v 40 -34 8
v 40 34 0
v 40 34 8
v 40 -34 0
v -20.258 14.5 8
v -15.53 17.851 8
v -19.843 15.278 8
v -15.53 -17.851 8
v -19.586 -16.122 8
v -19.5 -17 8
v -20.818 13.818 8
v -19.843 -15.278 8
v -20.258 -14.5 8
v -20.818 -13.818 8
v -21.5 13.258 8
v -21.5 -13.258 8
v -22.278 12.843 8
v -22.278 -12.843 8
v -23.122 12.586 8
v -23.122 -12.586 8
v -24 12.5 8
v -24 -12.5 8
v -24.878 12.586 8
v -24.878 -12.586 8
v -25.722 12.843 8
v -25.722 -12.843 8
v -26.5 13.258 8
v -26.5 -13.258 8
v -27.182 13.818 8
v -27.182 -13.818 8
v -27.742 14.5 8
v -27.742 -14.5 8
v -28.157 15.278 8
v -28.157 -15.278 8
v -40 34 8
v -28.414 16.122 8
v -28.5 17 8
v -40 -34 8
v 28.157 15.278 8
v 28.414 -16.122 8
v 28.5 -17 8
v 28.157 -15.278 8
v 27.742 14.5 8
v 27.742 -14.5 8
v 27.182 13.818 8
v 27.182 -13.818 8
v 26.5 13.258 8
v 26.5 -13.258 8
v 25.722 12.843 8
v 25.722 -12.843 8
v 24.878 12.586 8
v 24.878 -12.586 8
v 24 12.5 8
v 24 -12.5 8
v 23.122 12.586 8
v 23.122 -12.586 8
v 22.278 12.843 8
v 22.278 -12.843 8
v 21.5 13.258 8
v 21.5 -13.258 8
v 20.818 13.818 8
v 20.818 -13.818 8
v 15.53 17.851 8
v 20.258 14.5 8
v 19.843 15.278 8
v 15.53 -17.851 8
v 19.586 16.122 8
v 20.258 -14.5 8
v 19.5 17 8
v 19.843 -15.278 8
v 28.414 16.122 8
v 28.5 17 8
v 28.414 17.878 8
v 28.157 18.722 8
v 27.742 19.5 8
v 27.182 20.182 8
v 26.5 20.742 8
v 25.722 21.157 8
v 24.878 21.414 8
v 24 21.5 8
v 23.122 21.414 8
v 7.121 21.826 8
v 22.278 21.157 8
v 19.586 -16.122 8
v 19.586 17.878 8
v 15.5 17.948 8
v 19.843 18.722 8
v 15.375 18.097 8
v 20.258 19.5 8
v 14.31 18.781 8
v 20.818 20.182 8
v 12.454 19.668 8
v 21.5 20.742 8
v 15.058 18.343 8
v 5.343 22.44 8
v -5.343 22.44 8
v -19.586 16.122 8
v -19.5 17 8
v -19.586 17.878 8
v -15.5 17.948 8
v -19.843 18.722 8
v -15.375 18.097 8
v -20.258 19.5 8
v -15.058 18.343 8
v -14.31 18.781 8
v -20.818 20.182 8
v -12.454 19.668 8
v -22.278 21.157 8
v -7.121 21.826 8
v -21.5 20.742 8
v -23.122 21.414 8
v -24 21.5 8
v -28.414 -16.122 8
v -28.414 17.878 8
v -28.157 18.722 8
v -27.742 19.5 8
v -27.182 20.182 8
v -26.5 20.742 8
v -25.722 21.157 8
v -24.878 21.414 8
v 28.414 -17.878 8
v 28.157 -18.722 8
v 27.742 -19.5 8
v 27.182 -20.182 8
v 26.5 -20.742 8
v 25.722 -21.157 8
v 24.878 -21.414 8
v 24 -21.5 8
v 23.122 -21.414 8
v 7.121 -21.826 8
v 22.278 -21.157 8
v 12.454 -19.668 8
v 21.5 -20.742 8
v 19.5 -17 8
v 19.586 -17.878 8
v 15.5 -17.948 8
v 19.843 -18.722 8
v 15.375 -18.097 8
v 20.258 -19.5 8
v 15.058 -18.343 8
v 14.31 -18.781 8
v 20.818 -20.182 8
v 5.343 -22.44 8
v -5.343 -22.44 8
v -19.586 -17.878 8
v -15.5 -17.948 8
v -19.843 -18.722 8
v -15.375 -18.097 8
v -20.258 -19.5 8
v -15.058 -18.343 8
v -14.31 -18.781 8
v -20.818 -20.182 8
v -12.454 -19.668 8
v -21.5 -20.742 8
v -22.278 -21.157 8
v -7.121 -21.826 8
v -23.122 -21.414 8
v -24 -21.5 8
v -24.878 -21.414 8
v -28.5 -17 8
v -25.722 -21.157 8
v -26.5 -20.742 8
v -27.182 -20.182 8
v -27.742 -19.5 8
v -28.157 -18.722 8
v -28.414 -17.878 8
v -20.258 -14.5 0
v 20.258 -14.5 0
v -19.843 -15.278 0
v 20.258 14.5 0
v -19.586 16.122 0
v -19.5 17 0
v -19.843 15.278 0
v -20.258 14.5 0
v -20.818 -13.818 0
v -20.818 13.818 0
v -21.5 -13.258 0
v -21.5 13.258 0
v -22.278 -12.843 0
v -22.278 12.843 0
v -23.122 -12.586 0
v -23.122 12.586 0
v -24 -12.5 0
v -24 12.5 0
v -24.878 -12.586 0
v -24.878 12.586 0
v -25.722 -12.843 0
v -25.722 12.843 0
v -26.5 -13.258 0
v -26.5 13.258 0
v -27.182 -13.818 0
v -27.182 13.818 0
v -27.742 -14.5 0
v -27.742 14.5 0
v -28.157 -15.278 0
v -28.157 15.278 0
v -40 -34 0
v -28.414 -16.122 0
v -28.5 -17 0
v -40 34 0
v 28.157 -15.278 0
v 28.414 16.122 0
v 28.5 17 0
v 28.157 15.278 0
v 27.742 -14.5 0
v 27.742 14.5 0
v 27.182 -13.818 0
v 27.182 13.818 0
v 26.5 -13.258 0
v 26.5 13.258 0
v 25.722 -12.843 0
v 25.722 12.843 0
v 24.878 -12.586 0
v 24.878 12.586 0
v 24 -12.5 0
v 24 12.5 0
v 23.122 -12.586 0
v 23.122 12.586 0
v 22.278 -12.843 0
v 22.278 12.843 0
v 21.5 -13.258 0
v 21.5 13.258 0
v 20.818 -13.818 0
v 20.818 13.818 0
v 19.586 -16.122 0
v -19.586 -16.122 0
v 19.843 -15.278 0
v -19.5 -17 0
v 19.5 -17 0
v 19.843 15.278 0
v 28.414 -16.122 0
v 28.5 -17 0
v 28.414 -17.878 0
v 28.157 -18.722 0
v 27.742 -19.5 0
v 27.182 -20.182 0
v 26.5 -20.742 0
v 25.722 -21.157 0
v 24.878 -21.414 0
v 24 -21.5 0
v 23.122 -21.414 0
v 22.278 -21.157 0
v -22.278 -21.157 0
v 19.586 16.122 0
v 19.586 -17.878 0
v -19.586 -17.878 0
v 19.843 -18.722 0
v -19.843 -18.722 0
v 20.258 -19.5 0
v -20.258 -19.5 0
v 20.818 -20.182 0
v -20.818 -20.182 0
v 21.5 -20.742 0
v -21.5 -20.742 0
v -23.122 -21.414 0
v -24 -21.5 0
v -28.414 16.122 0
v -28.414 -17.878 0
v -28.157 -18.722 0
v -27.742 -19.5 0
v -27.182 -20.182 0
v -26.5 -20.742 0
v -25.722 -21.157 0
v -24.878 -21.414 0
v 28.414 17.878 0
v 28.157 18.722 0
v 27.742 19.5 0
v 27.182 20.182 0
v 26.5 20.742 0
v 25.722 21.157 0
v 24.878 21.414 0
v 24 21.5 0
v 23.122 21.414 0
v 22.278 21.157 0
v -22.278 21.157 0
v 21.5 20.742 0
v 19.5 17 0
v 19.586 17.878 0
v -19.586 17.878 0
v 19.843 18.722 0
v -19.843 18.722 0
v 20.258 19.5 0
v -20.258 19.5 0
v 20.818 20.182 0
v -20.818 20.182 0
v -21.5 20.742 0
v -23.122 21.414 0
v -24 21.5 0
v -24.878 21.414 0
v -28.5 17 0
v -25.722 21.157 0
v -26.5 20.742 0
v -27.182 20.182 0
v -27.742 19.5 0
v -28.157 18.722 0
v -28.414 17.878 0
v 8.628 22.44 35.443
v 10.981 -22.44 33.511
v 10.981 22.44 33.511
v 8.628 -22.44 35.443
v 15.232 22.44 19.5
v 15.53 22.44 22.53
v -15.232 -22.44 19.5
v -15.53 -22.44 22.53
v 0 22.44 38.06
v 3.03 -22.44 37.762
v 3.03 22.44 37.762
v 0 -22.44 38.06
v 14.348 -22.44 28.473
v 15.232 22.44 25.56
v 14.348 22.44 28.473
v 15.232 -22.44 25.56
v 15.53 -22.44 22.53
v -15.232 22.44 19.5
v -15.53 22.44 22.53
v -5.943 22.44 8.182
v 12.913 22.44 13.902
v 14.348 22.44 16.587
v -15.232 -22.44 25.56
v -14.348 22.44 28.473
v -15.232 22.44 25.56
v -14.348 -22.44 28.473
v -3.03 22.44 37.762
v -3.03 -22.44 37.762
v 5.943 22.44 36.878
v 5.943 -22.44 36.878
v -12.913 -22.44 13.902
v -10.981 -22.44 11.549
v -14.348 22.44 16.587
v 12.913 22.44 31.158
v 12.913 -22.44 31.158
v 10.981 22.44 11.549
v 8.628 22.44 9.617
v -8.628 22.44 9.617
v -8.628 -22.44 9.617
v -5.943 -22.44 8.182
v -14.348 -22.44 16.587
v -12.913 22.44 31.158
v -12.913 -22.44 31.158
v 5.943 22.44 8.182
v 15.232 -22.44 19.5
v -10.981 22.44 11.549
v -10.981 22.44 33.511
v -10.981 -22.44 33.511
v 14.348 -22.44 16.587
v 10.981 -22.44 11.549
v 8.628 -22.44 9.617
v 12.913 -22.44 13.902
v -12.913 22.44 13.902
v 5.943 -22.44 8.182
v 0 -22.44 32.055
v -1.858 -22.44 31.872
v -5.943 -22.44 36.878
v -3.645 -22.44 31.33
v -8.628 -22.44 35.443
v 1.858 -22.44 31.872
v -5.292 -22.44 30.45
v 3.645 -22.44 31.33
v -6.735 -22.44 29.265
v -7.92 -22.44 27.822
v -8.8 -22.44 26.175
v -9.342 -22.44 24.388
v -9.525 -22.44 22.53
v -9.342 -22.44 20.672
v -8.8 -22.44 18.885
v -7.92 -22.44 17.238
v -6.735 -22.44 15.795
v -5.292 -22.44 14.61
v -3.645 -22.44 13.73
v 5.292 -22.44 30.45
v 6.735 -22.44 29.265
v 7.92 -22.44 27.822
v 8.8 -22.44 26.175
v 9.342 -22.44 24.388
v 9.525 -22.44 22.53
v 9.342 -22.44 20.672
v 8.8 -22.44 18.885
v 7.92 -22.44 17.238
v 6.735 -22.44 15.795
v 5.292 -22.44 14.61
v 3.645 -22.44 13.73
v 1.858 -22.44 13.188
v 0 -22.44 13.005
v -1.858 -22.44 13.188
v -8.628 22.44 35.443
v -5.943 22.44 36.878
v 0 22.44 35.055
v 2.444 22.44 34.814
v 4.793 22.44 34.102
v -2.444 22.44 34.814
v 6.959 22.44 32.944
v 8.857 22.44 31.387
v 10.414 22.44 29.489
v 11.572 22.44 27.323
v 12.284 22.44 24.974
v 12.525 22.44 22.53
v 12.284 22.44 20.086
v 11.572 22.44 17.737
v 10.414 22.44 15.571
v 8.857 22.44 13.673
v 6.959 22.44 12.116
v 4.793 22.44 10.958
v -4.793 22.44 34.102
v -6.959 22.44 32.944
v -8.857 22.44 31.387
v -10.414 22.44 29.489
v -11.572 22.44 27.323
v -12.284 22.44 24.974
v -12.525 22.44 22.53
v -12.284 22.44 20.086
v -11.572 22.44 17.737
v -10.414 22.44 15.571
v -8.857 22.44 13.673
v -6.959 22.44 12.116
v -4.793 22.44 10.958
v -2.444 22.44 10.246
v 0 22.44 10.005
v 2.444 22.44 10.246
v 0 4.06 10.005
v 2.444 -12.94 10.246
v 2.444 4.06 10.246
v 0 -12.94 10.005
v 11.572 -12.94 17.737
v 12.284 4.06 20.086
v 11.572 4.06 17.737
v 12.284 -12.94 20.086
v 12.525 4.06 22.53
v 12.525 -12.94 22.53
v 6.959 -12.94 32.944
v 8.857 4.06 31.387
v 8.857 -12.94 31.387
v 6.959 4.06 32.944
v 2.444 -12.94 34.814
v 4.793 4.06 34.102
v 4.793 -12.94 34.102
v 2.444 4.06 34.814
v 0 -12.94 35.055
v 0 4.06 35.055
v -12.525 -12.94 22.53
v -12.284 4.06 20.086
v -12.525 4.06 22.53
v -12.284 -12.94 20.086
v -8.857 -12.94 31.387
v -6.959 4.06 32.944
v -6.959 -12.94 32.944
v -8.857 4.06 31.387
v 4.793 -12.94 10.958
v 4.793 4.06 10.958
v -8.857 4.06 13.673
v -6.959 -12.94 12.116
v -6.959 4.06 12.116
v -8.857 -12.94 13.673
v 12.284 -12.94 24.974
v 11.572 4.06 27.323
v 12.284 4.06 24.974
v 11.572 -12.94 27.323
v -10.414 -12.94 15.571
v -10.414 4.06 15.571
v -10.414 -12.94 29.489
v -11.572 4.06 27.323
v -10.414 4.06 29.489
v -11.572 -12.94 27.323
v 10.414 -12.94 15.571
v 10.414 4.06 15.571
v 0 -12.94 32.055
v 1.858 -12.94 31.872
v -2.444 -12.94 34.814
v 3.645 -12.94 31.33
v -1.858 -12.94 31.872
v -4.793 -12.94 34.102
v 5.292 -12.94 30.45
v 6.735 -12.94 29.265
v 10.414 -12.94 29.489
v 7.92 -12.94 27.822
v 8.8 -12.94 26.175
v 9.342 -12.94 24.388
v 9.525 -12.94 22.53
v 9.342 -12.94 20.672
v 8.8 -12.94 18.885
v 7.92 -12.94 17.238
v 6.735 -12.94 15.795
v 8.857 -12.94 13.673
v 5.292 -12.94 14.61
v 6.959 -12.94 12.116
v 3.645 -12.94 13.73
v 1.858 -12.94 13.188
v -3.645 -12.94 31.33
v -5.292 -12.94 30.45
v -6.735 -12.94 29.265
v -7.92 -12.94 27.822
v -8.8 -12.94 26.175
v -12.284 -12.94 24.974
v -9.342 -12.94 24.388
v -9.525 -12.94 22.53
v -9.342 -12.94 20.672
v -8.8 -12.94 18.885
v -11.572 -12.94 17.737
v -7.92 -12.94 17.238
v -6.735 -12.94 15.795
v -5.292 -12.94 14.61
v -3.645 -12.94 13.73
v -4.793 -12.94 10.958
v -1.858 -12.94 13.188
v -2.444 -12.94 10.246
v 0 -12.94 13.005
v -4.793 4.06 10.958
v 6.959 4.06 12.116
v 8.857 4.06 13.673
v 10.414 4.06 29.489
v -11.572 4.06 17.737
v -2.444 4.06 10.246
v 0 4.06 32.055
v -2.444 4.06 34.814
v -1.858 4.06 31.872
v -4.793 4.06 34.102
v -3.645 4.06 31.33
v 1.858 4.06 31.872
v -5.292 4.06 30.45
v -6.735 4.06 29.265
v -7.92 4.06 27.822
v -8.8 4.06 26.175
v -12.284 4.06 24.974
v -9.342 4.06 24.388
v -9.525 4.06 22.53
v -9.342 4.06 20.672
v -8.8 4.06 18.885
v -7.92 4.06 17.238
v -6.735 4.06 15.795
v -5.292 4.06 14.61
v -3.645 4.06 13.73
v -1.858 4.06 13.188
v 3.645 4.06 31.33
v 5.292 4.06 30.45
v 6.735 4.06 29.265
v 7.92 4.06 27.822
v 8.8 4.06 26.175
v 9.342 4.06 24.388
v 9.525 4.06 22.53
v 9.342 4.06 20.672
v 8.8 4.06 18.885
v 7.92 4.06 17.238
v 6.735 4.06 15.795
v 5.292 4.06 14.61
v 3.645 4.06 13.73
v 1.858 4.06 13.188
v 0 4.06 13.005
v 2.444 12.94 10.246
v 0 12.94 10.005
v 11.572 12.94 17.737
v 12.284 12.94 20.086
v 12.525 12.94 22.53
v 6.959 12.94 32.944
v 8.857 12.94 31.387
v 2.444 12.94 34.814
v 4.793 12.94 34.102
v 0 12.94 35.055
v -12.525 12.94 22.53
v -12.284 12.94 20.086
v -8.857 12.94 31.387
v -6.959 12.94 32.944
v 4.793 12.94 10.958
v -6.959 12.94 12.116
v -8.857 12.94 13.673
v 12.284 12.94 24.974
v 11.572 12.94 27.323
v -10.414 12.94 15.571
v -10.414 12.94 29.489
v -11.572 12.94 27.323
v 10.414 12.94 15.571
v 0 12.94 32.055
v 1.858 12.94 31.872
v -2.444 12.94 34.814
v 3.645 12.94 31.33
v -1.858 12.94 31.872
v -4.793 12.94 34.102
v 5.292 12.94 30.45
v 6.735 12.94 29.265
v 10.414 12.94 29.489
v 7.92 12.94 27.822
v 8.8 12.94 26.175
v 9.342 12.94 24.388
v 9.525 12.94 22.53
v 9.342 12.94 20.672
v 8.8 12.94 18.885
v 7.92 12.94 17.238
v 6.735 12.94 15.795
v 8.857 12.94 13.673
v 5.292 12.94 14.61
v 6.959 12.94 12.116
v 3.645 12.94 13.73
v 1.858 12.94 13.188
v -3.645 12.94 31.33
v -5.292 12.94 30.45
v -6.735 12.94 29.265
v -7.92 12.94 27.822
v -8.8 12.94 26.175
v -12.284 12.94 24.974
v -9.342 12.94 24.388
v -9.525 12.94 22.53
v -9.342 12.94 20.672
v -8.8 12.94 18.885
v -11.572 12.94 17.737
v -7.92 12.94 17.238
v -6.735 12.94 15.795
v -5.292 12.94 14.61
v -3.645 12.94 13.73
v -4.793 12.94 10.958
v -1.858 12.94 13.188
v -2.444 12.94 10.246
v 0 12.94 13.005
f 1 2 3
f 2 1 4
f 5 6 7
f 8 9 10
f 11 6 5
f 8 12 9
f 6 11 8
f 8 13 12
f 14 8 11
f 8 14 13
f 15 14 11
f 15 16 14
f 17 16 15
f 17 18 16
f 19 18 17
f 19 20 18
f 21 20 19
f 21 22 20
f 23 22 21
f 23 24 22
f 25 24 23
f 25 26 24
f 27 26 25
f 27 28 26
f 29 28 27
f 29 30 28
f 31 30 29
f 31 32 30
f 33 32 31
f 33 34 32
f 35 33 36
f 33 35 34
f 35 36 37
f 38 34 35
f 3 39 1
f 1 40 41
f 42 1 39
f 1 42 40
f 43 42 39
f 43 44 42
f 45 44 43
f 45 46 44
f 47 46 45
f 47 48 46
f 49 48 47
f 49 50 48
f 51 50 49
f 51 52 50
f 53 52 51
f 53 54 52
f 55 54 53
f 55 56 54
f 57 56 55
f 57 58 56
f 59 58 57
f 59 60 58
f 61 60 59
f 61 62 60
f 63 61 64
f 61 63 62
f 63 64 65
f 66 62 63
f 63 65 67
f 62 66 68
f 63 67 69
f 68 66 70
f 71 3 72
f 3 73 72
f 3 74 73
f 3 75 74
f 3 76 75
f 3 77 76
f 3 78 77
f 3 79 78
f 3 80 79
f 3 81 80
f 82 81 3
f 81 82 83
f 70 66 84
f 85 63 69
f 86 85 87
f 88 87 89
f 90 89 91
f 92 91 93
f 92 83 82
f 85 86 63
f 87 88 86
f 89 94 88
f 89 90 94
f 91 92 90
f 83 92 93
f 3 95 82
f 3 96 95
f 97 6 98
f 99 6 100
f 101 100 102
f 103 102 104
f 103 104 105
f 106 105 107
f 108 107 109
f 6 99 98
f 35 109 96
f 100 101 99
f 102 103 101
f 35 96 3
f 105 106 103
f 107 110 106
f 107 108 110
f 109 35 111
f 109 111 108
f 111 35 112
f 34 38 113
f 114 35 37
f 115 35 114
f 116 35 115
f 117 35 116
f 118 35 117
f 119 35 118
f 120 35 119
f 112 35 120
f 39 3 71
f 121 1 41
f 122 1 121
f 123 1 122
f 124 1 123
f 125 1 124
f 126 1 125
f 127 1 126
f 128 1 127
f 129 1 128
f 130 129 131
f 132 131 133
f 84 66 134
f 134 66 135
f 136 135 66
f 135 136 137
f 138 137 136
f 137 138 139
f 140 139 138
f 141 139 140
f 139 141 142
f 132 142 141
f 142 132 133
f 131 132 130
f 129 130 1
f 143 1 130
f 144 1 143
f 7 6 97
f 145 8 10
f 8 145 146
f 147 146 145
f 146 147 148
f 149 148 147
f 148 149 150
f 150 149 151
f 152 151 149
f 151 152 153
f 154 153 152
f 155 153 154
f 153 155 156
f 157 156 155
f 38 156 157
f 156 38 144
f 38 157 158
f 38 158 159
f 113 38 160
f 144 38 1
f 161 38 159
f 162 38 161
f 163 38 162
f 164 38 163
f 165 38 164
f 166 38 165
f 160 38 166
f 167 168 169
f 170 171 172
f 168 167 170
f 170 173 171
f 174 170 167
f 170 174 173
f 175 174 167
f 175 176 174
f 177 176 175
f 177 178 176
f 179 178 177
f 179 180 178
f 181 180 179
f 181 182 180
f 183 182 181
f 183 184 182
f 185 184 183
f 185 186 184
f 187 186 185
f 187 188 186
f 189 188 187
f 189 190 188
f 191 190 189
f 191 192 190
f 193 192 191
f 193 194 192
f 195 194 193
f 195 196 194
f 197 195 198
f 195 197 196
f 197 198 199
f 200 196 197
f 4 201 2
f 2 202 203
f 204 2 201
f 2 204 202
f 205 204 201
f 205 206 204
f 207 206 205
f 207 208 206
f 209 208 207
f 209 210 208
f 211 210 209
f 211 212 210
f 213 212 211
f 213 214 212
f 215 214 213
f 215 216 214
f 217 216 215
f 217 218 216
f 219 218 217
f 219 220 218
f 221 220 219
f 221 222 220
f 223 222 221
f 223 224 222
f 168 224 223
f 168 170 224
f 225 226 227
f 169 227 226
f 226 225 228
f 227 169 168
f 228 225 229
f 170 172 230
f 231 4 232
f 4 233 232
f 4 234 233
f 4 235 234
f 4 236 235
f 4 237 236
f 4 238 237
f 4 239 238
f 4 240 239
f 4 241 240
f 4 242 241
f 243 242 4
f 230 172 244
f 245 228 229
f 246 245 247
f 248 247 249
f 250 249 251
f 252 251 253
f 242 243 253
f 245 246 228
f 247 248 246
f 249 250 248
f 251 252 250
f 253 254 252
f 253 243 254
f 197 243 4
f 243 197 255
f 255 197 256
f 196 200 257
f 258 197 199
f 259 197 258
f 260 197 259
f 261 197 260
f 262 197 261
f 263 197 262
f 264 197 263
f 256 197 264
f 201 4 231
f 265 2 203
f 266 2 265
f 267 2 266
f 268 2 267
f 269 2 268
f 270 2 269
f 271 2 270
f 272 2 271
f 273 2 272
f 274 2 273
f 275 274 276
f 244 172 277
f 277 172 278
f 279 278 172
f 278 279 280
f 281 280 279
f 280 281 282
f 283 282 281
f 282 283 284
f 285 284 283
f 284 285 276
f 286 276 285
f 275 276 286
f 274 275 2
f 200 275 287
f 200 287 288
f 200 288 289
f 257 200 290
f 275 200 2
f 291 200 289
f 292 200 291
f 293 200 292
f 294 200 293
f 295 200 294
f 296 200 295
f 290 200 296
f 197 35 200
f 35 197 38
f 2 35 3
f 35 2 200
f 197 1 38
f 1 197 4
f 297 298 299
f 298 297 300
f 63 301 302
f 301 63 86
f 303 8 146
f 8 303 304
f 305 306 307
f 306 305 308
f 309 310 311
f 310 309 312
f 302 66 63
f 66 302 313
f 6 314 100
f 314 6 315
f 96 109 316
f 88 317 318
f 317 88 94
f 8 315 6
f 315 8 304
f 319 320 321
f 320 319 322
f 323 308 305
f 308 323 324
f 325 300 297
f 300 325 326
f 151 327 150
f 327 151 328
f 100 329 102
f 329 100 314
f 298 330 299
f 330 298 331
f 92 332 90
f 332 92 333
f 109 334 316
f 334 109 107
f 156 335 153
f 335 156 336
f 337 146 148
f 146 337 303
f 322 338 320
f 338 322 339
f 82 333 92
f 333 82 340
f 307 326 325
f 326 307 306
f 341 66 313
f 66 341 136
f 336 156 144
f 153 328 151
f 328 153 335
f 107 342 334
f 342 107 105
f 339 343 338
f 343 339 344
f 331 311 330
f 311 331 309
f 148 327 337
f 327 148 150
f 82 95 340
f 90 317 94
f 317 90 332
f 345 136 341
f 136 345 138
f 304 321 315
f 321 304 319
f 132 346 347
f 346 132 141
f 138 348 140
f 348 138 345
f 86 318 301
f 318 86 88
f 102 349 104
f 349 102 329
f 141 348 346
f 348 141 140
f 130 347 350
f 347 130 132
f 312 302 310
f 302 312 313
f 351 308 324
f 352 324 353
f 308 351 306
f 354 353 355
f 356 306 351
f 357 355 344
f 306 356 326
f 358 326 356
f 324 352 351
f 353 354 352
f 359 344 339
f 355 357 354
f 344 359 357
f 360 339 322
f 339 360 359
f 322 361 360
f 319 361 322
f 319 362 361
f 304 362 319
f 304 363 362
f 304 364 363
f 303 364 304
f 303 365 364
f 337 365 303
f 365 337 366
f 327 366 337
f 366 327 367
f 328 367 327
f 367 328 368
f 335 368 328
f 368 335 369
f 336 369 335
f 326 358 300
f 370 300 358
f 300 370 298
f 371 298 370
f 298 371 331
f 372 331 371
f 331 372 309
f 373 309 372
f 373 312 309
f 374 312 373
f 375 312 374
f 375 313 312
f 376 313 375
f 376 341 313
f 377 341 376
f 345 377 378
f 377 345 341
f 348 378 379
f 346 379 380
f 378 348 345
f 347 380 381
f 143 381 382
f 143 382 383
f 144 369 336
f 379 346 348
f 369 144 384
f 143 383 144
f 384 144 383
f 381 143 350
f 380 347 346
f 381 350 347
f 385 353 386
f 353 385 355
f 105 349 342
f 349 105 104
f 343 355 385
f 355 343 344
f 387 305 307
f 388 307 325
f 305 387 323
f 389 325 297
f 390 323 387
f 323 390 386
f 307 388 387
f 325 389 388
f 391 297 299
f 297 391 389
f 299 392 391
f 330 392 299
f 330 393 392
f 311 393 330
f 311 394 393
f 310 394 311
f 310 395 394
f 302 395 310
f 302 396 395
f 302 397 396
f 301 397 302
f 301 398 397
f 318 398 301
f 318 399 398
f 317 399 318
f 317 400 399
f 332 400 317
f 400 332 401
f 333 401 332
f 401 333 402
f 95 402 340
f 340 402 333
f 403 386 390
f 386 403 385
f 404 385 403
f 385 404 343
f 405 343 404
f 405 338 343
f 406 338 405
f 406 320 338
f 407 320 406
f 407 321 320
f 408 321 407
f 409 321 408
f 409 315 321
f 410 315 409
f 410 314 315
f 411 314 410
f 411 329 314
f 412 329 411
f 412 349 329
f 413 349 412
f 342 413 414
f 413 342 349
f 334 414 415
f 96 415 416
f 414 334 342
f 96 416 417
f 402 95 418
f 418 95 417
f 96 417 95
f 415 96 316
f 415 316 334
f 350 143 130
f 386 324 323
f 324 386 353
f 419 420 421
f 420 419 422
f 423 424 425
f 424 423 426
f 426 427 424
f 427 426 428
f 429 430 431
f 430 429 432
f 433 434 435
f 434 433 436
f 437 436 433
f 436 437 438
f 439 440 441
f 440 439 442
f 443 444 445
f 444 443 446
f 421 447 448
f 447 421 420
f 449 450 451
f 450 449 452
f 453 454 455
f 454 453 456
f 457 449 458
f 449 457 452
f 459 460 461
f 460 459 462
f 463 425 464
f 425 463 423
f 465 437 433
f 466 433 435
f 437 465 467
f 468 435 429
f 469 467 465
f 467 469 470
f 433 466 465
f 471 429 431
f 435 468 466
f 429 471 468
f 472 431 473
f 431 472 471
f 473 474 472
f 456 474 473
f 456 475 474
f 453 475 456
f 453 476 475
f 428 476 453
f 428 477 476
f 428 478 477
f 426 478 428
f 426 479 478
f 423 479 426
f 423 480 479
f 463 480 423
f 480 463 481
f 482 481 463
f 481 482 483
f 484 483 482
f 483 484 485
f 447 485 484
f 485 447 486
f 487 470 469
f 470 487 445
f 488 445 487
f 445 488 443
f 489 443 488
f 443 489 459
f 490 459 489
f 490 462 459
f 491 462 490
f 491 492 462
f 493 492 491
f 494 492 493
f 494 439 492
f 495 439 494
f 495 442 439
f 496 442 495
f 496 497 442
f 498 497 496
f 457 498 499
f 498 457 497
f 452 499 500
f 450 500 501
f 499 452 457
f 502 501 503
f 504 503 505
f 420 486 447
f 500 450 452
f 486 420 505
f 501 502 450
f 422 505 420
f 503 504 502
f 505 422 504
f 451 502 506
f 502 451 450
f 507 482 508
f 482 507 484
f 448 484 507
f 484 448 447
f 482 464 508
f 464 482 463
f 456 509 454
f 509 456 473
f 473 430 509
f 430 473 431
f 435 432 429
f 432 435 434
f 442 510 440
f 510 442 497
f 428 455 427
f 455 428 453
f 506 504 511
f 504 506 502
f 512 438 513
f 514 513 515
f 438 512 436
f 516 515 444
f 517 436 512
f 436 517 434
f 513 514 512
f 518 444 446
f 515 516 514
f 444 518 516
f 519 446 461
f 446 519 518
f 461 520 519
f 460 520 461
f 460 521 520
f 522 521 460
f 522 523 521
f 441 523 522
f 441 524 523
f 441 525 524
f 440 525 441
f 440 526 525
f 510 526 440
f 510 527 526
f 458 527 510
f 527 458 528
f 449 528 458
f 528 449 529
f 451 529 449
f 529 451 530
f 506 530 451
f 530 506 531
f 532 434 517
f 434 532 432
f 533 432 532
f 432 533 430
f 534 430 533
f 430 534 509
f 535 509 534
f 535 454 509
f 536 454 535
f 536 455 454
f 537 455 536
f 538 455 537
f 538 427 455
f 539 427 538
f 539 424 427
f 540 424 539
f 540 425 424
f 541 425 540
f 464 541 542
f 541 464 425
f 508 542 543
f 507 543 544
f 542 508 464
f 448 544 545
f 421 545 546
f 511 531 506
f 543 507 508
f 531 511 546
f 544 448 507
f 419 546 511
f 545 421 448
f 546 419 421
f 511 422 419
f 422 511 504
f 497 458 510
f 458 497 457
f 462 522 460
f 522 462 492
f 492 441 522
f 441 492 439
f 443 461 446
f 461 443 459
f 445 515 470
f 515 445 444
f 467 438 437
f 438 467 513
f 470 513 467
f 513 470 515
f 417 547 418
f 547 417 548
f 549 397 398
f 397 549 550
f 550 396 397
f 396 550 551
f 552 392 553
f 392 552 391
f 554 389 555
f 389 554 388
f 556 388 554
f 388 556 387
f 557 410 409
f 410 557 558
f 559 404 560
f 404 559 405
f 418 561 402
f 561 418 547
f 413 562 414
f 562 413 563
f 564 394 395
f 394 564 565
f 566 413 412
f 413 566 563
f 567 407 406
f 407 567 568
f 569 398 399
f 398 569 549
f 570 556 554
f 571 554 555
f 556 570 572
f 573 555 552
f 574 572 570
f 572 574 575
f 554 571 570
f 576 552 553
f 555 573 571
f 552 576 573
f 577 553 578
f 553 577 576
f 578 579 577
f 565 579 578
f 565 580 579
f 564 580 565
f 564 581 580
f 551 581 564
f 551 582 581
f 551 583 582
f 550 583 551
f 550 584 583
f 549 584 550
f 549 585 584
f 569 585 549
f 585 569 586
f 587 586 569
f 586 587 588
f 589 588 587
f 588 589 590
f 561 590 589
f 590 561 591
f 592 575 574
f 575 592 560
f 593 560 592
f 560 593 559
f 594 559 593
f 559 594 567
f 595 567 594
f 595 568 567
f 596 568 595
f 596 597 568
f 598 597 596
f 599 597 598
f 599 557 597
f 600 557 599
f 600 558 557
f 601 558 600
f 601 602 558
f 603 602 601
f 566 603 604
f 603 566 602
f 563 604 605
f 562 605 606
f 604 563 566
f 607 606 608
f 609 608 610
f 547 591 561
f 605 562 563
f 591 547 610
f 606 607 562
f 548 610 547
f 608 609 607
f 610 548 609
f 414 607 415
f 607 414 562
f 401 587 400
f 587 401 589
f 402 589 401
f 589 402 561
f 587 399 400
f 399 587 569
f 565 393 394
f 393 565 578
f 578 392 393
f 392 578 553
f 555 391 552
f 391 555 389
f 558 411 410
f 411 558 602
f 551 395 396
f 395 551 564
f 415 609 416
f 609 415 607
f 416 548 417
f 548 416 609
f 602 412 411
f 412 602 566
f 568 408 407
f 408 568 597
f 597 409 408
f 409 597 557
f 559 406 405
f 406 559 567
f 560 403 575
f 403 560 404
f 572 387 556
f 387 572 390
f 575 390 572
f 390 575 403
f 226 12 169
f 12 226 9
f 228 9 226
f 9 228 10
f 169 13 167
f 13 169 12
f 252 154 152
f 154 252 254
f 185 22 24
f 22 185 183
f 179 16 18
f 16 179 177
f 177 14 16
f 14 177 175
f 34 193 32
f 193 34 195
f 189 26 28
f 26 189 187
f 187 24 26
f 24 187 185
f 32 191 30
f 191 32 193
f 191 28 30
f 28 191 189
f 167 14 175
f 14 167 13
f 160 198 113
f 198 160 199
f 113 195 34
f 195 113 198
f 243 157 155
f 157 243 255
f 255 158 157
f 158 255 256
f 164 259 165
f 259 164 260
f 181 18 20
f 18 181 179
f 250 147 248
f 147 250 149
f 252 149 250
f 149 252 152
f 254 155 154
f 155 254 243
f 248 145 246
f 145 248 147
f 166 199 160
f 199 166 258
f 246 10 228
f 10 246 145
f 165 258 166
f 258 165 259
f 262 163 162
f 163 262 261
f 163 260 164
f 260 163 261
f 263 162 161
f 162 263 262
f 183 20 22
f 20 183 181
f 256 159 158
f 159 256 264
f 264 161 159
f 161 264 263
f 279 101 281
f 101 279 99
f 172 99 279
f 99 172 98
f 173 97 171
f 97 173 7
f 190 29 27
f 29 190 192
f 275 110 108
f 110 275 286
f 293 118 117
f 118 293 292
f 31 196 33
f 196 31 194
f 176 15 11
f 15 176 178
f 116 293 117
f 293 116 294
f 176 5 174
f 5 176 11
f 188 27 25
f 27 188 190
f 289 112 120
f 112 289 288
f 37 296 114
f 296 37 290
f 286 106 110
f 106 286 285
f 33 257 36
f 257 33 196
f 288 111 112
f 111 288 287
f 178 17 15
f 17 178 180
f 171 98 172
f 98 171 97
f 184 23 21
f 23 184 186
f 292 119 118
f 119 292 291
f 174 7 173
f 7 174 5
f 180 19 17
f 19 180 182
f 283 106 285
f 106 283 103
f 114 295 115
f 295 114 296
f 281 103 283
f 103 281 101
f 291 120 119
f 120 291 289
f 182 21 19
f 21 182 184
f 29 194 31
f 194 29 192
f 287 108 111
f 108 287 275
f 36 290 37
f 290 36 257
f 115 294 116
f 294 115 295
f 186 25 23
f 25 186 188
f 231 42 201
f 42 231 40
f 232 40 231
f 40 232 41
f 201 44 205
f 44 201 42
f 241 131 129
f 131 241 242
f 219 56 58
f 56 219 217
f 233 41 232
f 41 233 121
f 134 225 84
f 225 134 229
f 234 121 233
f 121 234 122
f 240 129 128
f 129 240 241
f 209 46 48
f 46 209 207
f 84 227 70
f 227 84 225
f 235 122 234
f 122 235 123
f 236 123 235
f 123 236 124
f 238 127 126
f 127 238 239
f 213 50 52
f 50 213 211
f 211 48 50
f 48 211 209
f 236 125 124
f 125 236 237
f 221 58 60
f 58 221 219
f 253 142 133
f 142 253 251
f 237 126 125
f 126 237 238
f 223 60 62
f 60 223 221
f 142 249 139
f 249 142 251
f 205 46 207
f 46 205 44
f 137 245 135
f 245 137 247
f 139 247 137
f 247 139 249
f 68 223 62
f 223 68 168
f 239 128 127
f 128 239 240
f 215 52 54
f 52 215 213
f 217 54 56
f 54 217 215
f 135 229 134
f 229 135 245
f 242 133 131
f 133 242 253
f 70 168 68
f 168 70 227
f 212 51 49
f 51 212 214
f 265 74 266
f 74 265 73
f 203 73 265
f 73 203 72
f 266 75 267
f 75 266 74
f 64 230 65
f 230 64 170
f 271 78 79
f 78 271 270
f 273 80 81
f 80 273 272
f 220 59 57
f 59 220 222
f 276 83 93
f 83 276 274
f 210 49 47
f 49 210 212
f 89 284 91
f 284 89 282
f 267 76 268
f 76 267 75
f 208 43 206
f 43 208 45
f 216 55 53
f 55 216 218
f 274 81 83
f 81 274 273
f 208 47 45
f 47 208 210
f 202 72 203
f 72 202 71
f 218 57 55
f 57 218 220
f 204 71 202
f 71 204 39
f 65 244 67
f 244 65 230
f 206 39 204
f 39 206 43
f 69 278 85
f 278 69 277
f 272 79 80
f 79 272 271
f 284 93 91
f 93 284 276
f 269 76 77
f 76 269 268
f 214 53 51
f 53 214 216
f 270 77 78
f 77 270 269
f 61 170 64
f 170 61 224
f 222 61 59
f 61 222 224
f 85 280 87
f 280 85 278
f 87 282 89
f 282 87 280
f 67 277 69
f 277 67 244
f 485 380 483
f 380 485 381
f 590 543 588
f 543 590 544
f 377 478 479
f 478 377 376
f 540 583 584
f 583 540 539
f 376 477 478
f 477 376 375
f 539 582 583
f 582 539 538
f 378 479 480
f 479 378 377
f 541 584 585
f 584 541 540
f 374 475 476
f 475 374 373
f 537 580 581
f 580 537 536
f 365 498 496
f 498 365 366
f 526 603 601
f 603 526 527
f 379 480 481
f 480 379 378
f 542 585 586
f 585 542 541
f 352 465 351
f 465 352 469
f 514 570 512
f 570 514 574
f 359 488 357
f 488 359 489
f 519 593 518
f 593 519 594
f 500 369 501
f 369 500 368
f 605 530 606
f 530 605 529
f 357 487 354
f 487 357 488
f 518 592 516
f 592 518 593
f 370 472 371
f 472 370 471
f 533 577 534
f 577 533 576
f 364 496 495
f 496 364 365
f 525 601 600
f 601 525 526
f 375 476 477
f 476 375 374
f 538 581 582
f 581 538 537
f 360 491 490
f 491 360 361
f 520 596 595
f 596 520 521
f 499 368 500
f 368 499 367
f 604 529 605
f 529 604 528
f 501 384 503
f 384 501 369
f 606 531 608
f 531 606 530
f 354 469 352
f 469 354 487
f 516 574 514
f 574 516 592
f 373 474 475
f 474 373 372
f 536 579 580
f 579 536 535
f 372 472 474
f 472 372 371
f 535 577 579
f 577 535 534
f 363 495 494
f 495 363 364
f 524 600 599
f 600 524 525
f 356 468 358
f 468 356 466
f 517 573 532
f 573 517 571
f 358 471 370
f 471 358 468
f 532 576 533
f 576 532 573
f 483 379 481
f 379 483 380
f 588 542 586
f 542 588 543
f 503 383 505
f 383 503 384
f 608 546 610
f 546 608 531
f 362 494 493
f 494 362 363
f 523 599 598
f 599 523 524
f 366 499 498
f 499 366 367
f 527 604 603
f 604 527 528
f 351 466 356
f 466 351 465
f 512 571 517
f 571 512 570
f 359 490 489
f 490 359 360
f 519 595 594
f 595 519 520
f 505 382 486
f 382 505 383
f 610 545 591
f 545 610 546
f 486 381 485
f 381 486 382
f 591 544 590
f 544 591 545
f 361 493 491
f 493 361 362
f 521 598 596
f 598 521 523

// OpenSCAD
$fn = 32;

// ----------------------------------------------------------------------
// Bearing block: 80 x 68 mm base, 19.05 mm bore at 22.53 mm
// ----------------------------------------------------------------------

// --- parameters (mm) ---
base_w = 80;              // base width
base_d = 68;              // base depth
base_t = 8;               // base thickness
bore_d = 19.05;           // shaft / bearing bore
house_r = 15.53;          // housing outer radius
house_len = 44.88;        // housing length along the shaft
foot_w = 31.06;           // foot width under the housing
foot_len = 34.88;         // foot length along the shaft
axis_z = 22.53;           // bore axis height above the base
holes_d = 9;              // mounting holes
hole_x = 24;              // mounting hole spacing
seat_d = 12;              // bearing seat depth
seat_wall = 3;            // seat wall thickness

difference() {
  union() {
    /* base plate with its underside on z = 0 */
    translate([0, 0, base_t / 2]) cube([base_w, base_d, base_t], center = true);
    /* hull foot: a straight web blending into the round housing */
    hull() {
      translate([0, 0, base_t - 0.5]) cube([foot_w, foot_len, 1.6], center = true);
      translate([0, 0, axis_z]) rotate([-90, 0, 0]) cylinder(h = house_len, d = 2 * house_r, center = true);
    }
  }
  /* bore through the housing, 2.5 mm clear on both sides */
  translate([0, 0, axis_z]) rotate([-90, 0, 0]) cylinder(h = house_len + 5, d = bore_d, center = true);
  /* bearing seats, recessed into both ends of the housing */
  for (sy = [-1, 1]) {
    translate([0, sy * (house_len / 2 - seat_d + 2.5), axis_z]) rotate([-90, 0, 0]) cylinder(h = seat_d + 5, d = bore_d + 2 * seat_wall);
  }
  /* mounting holes through the base plate */
  for (hx = [-24, 24]) {
    for (hy = [-17, 17]) {
      translate([hx, hy, -2.5]) cylinder(h = base_t + 5, d = holes_d);
    }
  }
}
